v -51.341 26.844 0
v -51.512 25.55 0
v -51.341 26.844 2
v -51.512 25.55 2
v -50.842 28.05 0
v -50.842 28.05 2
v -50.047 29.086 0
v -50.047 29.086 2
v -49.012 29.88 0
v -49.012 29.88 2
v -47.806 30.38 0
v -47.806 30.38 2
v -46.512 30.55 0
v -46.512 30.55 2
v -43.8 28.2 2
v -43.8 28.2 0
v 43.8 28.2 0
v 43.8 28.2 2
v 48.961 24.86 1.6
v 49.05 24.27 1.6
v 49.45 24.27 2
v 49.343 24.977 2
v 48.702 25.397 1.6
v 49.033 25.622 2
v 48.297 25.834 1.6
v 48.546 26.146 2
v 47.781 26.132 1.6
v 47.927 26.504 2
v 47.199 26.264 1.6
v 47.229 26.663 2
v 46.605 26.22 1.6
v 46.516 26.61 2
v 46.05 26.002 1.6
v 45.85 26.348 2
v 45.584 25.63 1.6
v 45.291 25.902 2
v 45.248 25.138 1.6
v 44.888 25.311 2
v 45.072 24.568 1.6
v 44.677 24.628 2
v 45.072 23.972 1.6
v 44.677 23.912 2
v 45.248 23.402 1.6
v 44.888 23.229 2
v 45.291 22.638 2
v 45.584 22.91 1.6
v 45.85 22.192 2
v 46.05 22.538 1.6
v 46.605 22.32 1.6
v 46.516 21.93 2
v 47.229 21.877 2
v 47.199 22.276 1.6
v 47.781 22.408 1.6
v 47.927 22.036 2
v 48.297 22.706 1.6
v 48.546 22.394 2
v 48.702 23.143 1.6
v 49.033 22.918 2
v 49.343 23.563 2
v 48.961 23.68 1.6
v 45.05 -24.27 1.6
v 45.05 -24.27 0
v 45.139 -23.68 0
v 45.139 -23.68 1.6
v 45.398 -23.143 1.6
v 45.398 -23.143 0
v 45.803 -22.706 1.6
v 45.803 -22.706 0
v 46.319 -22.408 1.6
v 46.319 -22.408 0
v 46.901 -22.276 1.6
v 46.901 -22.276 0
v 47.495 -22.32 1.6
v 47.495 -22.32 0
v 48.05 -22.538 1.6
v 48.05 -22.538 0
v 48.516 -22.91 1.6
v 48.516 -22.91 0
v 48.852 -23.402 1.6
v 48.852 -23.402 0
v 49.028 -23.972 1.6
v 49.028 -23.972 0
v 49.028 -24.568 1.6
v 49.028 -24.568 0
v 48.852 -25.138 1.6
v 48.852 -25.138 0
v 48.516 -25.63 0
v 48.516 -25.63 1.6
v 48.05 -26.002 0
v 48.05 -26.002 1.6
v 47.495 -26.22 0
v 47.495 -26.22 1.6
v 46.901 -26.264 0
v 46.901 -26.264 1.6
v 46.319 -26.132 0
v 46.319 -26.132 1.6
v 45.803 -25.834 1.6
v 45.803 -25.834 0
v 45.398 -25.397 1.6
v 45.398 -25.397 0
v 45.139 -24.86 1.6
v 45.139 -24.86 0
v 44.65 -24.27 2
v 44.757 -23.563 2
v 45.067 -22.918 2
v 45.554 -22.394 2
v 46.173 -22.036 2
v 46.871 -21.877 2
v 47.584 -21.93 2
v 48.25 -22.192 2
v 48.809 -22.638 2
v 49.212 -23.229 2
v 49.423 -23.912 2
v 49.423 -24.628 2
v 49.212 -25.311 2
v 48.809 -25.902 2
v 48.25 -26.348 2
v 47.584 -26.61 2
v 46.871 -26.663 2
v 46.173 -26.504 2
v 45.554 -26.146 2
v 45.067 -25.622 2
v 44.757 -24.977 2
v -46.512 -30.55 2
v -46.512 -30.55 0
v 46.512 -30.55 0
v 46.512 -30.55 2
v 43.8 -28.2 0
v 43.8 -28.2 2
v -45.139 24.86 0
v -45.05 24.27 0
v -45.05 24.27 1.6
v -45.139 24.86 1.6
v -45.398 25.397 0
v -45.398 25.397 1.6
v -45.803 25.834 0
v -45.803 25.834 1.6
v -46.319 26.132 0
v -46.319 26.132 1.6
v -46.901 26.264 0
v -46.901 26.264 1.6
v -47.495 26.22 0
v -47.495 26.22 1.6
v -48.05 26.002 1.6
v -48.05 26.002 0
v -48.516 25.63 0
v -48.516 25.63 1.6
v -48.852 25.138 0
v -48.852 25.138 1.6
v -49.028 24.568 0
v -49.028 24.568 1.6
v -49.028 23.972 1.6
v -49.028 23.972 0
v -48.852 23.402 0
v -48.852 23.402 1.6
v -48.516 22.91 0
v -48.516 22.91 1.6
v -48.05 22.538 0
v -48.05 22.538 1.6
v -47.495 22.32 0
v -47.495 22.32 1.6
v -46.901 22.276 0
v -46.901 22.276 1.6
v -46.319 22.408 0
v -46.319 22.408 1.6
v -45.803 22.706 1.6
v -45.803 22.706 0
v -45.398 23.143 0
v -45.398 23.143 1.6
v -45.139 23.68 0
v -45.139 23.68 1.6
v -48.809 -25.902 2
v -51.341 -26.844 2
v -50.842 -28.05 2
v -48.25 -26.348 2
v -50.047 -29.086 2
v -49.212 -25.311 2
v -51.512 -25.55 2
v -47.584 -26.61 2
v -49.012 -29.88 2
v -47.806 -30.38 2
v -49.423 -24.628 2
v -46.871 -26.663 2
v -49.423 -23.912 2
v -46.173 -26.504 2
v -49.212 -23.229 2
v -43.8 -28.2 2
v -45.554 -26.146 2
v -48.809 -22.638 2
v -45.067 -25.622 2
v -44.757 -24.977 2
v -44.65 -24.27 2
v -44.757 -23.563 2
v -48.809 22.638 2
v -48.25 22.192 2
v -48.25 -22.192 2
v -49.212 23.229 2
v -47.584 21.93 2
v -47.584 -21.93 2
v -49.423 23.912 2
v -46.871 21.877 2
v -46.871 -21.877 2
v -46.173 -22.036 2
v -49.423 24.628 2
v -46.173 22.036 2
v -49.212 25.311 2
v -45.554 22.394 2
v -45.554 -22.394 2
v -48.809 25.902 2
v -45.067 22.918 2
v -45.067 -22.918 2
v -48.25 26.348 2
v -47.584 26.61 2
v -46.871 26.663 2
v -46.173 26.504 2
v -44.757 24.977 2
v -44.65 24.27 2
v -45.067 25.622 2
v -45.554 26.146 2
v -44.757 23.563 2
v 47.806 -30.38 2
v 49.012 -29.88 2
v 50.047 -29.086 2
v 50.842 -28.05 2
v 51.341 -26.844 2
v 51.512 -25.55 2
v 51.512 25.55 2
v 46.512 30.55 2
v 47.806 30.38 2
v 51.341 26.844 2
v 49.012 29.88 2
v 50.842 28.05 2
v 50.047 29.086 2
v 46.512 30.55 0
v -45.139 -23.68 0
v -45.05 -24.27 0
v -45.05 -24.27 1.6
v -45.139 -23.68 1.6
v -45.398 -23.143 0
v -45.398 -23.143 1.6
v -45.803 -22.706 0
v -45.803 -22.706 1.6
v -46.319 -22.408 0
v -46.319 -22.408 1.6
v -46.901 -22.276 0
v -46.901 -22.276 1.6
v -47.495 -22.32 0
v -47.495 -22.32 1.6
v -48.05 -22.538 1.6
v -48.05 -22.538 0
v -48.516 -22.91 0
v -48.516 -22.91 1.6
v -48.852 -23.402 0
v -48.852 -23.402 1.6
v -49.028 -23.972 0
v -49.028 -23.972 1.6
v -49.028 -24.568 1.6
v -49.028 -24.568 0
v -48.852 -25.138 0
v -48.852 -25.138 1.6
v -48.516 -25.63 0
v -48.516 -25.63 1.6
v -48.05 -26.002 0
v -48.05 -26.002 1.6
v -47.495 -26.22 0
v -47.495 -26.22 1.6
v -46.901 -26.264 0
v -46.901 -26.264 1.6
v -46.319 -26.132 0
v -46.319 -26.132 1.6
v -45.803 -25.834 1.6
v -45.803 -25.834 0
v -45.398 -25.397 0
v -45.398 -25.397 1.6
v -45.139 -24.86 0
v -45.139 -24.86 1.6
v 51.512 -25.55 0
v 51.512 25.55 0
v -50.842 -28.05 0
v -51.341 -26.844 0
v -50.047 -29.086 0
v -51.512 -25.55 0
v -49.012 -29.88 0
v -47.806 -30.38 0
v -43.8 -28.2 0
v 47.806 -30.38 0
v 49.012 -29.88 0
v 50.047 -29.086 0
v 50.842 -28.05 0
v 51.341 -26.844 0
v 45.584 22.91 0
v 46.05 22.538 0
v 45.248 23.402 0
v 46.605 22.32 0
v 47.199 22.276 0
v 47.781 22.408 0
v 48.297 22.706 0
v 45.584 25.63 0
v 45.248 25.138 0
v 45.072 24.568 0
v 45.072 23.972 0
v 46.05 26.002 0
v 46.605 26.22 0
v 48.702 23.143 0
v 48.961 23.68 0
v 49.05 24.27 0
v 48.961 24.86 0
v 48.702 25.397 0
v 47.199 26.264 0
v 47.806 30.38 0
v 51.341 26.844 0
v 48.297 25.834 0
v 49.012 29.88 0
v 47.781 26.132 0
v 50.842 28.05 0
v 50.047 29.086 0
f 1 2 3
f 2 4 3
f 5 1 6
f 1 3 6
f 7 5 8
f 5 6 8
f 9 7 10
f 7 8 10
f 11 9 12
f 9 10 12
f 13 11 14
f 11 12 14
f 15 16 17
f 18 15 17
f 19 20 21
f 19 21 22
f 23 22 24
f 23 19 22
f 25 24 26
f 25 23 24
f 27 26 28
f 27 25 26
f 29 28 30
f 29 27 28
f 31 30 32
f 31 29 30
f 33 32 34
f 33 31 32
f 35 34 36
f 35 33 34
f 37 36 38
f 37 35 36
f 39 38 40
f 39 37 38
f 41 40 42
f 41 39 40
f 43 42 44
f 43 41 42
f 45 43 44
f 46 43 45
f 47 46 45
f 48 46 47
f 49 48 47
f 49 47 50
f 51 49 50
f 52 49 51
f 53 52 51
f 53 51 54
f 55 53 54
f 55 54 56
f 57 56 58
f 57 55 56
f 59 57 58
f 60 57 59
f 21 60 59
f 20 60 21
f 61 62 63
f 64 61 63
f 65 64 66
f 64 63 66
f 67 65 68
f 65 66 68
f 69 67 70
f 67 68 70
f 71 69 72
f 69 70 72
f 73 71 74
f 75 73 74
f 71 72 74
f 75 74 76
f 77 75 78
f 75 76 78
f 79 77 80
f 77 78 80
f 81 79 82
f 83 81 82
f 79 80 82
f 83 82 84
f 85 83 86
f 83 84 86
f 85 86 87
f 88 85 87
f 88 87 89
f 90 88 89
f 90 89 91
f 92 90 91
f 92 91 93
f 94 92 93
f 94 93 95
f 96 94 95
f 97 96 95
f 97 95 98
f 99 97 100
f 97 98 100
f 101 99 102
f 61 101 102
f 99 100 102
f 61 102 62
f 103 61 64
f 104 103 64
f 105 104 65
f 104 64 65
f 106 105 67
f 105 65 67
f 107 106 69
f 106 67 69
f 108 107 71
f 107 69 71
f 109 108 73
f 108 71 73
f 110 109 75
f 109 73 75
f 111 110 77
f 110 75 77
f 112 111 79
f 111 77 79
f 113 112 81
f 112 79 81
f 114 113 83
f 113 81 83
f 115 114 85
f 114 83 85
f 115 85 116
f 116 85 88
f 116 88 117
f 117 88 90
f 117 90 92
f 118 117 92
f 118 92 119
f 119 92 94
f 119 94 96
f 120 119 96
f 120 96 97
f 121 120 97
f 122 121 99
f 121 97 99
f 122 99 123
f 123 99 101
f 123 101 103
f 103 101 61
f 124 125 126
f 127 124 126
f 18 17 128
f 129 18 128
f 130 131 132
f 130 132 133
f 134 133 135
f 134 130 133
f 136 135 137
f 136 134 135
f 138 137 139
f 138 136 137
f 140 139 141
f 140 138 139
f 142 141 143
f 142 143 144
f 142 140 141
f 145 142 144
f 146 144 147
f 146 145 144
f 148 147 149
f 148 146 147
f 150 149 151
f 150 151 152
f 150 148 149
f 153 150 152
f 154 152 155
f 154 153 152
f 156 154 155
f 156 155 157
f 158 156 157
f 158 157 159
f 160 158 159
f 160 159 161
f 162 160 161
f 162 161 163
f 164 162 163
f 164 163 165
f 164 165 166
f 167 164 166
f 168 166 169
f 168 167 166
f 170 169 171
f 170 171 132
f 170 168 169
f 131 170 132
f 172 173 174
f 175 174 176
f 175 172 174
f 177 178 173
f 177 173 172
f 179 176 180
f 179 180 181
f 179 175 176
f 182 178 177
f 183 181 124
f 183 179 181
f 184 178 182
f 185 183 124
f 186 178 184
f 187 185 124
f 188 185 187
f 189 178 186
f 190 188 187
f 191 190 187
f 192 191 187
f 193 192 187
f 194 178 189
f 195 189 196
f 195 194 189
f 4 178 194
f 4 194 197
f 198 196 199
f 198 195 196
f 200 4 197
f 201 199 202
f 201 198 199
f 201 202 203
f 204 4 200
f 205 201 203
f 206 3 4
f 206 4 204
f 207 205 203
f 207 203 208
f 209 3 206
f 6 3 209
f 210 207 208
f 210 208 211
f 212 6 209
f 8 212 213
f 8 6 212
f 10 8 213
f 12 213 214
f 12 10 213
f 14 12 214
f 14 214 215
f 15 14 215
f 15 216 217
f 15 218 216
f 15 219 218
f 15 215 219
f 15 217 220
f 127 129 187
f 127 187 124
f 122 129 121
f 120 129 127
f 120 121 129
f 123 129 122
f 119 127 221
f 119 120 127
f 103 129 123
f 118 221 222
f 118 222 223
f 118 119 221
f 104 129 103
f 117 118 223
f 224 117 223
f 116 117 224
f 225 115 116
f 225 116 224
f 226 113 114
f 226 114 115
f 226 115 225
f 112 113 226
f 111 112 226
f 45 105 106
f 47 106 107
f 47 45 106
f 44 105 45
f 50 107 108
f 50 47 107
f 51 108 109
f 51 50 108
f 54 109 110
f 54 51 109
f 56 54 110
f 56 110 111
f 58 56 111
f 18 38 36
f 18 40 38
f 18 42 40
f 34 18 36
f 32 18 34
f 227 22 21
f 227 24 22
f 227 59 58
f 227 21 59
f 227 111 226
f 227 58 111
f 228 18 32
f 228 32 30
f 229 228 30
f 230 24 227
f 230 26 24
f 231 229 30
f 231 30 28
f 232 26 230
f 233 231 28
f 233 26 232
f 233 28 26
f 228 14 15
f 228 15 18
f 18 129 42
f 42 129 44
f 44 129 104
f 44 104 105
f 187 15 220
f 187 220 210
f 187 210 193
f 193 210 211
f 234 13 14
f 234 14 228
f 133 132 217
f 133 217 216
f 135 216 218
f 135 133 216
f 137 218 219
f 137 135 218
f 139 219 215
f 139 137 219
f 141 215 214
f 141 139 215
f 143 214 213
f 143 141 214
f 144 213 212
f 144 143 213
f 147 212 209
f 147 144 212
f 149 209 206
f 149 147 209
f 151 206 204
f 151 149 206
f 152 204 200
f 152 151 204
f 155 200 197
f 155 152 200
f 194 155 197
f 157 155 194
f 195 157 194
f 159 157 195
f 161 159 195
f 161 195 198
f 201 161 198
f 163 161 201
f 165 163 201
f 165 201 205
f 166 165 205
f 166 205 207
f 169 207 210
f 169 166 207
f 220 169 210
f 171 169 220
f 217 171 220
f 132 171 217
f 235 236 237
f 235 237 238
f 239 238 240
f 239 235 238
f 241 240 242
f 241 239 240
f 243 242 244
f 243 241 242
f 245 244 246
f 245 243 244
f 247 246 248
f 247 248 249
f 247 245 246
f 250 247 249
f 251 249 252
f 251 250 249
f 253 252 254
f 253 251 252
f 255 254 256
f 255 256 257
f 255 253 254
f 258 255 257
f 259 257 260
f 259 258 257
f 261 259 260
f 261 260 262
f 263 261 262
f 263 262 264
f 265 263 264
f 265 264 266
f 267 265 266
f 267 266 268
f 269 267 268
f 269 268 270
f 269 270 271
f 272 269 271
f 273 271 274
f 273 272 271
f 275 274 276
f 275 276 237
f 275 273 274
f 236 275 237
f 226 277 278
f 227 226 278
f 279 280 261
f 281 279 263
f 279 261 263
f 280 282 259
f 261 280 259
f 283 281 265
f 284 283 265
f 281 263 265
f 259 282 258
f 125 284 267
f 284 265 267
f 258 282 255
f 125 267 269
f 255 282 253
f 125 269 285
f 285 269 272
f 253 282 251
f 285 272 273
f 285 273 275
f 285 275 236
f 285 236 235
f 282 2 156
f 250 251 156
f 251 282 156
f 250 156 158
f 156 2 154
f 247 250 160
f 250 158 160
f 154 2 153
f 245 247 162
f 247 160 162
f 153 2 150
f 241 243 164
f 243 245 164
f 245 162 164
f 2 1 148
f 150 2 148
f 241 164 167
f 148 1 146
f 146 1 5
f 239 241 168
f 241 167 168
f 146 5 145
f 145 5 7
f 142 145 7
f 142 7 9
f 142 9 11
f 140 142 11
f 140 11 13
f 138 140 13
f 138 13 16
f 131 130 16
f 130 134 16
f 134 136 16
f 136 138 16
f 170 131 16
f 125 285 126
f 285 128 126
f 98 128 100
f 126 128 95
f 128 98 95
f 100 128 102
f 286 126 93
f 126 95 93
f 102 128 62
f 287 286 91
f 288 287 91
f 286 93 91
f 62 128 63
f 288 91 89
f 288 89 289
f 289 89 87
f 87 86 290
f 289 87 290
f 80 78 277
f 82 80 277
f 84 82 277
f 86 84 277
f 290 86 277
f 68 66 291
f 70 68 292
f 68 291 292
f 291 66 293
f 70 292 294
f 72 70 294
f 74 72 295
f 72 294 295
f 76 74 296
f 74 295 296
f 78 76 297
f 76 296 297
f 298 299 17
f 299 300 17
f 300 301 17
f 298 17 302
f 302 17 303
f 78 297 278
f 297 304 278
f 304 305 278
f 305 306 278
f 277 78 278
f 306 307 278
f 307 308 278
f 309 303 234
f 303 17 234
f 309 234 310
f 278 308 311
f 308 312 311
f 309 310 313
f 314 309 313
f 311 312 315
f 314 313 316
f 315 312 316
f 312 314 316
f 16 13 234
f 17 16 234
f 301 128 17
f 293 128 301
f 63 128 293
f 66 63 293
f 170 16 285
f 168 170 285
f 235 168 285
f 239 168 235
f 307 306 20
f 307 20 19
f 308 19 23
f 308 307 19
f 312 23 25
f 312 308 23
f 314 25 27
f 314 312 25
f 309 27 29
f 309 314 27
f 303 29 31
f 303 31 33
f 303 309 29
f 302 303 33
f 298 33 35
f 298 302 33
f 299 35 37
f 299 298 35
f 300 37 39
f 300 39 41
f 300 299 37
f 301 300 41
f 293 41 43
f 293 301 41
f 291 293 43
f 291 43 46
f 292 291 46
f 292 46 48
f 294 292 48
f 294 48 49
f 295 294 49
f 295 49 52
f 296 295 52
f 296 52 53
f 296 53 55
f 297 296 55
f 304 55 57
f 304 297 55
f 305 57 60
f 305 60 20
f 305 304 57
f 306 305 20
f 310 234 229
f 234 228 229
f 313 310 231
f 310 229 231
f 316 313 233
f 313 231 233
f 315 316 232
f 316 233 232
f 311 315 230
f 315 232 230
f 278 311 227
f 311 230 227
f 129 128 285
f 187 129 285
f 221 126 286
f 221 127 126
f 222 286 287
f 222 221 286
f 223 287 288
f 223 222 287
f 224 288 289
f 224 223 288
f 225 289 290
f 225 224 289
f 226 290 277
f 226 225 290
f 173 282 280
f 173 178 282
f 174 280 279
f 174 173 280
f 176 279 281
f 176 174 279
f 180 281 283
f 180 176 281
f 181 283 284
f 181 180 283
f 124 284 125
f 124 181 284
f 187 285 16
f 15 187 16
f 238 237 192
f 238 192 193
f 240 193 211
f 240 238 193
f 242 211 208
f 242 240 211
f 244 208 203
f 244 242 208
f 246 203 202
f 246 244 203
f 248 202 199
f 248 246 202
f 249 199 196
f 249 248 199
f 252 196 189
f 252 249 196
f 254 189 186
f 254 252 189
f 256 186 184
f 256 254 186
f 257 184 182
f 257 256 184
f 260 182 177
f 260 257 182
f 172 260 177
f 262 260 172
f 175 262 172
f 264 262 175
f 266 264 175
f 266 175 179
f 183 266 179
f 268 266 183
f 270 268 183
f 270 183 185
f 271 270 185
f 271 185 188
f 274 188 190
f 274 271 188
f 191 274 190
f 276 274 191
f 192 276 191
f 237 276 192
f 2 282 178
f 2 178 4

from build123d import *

# Parameters (mm, degrees)
F0_W     = 103.023604
F0_H     = 61.1
F0_R     = 2
F1_DEPTH = 2
F2_R     = 5
F3_SIZE  = 0.4


with BuildPart() as f1:
    # F0 (on Top) → F1 (new body)
    with BuildSketch(Plane.XY):
        Rectangle(F0_W, F0_H)
        with Locations((-47.05, -24.27)):
            Circle(F0_R, mode=Mode.SUBTRACT)
        with BuildLine():
            ThreePointArc((49.05, -24.27), (47.05, -26.27), (45.05, -24.27))
            ThreePointArc((45.05, -24.27), (47.05, -22.27), (49.05, -24.27))
        make_face(mode=Mode.SUBTRACT)
        with Locations((-47.05, 24.27)):
            Circle(F0_R, mode=Mode.SUBTRACT)
        Polygon((43.8, -28.2), (-43.8, -28.2), (-43.8, 28.2), (43.8, 28.2), (43.8, -24.27), align=None, mode=Mode.SUBTRACT)
        with Locations((47.05, 24.27)):
            Circle(F0_R, mode=Mode.SUBTRACT)
    extrude(amount=F1_DEPTH)

    # F2
    f2_edges = [f1.edges().sort_by_distance(p)[0] for p in [
        (51.511802, -30.55, 1),
        (51.511802, 30.55, 1),
        (-51.511802, -30.55, 1),
        (-51.511802, 30.55, 1),
    ]]
    fillet(f2_edges, radius=F2_R)

    # F3
    f3_edges = [f1.edges().sort_by_distance(p)[0] for p in [
        (45.05, -24.27, 2),
        (45.05, 24.27, 2),
        (-49.05, 24.27, 2),
        (-49.05, -24.27, 2),
    ]]
    chamfer(f3_edges, length=F3_SIZE)


solid = f1.part
